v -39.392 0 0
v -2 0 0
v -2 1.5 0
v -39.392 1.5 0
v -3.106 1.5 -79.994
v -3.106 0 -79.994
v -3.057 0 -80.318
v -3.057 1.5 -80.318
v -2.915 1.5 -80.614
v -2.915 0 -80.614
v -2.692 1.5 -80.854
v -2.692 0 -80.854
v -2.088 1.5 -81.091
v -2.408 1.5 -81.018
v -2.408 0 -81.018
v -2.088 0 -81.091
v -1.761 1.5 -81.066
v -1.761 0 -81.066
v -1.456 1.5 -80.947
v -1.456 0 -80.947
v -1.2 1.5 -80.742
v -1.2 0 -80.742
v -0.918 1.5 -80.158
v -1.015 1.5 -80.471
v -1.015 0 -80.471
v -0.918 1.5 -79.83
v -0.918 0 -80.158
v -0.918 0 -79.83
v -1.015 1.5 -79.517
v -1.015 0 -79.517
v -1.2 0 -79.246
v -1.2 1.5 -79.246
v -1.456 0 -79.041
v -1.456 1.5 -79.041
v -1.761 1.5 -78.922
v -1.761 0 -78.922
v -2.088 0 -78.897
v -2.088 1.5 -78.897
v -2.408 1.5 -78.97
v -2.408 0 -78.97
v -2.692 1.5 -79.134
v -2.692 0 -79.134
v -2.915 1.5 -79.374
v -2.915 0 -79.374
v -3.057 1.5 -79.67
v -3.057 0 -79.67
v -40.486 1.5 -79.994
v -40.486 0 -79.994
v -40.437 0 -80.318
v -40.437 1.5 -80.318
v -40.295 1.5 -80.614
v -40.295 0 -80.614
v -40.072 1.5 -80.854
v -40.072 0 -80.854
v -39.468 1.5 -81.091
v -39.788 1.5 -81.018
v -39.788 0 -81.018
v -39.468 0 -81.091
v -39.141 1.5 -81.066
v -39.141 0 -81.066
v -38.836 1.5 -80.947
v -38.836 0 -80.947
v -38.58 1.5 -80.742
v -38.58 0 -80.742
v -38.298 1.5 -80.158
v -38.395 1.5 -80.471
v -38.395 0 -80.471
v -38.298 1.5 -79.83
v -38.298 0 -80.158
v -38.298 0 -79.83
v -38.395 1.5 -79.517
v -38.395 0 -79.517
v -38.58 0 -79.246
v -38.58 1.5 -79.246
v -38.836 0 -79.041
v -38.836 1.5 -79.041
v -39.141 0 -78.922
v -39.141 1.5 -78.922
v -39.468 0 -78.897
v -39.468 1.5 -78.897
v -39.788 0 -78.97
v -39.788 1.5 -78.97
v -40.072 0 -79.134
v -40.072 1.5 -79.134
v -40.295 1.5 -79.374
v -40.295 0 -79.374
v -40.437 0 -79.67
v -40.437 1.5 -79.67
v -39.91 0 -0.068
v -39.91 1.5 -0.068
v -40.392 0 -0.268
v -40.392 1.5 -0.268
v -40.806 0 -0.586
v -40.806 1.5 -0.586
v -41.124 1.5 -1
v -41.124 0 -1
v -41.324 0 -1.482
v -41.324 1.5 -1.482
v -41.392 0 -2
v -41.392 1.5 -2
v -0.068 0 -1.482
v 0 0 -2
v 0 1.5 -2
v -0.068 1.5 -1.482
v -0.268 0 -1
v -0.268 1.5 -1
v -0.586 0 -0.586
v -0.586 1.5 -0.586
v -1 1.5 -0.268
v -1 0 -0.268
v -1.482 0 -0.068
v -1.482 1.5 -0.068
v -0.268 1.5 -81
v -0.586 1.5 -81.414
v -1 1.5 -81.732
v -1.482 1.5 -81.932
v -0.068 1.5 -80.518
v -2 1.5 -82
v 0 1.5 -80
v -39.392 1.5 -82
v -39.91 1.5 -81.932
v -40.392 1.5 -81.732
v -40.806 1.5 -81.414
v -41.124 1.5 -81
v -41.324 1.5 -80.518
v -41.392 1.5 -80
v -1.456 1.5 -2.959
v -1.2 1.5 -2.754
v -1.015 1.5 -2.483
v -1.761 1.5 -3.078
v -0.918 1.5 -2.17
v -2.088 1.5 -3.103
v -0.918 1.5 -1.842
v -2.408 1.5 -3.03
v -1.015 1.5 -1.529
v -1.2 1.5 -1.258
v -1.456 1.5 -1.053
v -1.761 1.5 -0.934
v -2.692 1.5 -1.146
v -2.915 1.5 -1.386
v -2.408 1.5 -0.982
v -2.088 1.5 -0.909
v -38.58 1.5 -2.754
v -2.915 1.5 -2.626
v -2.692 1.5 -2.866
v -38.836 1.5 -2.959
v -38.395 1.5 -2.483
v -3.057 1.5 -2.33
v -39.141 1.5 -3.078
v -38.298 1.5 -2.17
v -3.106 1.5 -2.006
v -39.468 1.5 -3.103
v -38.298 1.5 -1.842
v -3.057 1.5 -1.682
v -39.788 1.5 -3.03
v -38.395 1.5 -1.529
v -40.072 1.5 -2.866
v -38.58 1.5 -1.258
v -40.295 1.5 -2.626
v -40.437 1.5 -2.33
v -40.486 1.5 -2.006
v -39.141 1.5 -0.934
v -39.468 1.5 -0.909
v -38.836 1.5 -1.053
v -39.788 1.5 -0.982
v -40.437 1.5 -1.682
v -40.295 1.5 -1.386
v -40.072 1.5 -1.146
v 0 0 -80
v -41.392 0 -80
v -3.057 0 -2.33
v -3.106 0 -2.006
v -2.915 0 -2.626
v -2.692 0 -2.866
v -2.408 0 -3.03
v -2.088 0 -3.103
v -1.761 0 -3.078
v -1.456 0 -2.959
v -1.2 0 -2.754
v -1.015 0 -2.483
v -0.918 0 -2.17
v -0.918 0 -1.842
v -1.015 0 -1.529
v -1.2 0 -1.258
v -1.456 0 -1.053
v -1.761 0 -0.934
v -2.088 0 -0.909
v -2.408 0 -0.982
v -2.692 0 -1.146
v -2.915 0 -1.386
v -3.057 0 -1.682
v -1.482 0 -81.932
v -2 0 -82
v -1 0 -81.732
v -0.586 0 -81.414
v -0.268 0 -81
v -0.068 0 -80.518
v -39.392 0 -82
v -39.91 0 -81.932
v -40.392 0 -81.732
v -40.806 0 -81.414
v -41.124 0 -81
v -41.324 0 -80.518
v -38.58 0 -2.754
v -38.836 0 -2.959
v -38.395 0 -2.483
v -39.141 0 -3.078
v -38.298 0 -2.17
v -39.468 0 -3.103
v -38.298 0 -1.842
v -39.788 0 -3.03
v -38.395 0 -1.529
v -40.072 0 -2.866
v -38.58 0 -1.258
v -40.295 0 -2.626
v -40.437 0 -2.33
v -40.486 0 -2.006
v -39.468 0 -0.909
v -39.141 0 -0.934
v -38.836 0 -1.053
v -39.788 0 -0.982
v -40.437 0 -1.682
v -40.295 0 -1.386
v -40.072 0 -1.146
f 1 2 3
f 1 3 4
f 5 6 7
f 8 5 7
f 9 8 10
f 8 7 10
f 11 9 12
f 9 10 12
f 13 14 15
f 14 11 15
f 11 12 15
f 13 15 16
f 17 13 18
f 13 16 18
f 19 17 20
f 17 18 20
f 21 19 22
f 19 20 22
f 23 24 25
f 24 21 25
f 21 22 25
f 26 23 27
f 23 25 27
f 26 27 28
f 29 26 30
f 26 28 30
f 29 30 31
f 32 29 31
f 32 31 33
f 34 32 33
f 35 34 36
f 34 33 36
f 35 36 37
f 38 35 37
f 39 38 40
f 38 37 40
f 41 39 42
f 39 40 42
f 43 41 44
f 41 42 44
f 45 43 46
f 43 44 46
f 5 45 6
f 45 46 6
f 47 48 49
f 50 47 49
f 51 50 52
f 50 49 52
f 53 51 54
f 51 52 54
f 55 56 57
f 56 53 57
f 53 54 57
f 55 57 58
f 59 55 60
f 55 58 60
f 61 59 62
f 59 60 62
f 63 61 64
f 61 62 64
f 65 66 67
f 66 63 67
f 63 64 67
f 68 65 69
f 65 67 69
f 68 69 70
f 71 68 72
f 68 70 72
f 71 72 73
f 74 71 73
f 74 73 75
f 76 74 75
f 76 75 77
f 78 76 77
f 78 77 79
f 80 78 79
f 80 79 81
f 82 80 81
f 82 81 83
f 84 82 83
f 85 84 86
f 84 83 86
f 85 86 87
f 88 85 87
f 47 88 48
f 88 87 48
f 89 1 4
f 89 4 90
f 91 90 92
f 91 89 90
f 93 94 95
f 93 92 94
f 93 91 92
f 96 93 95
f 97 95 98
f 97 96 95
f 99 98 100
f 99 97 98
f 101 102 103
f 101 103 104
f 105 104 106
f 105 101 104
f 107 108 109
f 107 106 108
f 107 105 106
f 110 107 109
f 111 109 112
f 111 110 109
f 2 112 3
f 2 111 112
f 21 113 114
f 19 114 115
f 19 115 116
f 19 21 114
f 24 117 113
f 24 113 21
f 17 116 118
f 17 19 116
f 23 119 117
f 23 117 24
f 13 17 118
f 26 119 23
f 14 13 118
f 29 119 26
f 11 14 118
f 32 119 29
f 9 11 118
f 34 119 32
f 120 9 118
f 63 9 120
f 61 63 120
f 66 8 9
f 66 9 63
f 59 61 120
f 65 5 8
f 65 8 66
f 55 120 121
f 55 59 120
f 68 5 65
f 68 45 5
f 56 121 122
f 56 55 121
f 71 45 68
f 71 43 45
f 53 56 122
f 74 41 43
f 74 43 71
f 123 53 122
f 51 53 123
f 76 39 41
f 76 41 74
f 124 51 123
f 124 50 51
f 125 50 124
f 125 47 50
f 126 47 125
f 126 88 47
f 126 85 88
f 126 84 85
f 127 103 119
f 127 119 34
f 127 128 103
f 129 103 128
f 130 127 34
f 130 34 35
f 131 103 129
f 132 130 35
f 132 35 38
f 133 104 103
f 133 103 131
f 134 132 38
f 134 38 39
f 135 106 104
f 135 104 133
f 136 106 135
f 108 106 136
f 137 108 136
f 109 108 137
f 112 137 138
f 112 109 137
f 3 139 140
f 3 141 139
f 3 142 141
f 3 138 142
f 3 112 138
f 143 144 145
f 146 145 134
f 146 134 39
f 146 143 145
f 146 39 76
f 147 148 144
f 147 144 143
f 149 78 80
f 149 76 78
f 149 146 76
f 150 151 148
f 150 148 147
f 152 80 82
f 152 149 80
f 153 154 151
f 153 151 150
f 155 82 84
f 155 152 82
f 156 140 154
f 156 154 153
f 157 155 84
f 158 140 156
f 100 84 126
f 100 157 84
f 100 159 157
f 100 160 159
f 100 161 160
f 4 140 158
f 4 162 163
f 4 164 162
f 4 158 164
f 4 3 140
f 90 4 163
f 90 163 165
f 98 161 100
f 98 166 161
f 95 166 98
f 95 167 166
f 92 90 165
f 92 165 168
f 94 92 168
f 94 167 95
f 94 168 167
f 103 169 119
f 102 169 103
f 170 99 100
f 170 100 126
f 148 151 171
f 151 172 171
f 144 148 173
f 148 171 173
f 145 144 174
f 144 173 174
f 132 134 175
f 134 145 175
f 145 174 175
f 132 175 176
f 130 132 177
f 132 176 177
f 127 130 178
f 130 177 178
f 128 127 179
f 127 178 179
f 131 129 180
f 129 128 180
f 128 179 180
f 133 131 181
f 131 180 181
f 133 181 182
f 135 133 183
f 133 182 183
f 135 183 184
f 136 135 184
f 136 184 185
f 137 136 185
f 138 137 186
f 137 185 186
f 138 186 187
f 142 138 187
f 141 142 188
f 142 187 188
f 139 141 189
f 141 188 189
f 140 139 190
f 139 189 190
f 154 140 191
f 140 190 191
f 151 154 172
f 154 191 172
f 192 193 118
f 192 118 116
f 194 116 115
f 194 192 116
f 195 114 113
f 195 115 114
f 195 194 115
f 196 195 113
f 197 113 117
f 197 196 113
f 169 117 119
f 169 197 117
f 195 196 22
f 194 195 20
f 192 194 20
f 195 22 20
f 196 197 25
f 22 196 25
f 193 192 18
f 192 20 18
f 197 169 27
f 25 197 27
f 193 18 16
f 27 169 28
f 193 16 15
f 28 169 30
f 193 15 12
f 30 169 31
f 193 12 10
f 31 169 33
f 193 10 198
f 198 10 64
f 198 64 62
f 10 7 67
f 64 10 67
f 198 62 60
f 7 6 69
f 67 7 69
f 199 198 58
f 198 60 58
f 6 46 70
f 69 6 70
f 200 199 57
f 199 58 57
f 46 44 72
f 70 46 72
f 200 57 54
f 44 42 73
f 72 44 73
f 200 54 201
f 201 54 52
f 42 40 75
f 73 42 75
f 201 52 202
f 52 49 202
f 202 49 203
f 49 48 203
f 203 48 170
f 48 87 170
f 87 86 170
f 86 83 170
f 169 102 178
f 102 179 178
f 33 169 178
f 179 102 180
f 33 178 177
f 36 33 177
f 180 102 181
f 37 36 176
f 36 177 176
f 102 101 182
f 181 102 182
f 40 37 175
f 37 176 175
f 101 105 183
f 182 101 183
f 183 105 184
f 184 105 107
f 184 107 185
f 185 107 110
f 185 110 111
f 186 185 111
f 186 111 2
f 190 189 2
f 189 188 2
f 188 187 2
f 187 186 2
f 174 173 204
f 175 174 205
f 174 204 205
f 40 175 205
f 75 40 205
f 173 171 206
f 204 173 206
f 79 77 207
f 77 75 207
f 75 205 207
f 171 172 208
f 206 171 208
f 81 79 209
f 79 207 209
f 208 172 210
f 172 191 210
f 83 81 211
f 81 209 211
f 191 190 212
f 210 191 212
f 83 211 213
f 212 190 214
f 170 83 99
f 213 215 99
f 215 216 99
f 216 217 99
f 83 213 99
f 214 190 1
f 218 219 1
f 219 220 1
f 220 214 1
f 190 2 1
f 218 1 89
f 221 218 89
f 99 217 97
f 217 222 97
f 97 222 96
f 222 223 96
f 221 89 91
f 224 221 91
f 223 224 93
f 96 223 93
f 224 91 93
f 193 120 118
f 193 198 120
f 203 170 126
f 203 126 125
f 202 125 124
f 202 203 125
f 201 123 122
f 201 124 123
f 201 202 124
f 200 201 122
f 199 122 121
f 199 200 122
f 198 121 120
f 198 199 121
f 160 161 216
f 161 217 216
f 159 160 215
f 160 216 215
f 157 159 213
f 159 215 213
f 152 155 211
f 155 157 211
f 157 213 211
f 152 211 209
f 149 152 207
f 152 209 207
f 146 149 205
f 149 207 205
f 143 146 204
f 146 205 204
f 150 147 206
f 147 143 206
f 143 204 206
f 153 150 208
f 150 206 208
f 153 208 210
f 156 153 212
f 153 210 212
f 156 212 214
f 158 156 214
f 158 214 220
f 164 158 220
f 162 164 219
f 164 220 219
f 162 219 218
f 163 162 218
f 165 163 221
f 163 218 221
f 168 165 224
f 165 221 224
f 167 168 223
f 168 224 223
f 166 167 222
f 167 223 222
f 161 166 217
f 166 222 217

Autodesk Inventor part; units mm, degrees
ref_plane "YZ Plane" through (0, 0, 0) normal (1, 0, 0) x (0, 1, 0)
ref_plane "XZ Plane" through (0, 0, 0) normal (0, 1, 0) x (-1, 0, 0)
ref_plane "XY Plane" through (0, 0, 0) normal (0, 0, 1) x (1, 0, 0)
sketch "Sketch1" plane through (0, 0, 0) normal (0, 1, 0) x (-1, 0, 0)
  line L0 (2, 0) -> (39.392, 0)
  line L1 (41.392, -2) -> (41.392, -80)
  line L2 (39.392, -82) -> (2, -82)
  line L3 (0, -80) -> (0, -2)
  arc A0 (41.392, -2) -> (39.392, 0) centre (39.392, -2) ccw
  arc A1 (39.392, -82) -> (41.392, -80) centre (39.392, -80) ccw
  arc A2 (0, -80) -> (2, -82) centre (2, -80) ccw
  arc A3 (2, 0) -> (0, -2) centre (2, -2) ccw
  circle A4 centre (39.386, -2.006) radius 1.1
  circle A5 centre (39.386, -79.994) radius 1.1
  circle A6 centre (2.006, -2.006) radius 1.1
  circle A7 centre (2.006, -79.994) radius 1.1
  point P0 (0, 0)
  point P1 (41.392, -82)
  point P2 (41.392, 0)
  point P3 (0, -82)
  dimension "d0" = 41.392
  dimension "d1" = 82
  dimension "d2" = 2
  dimension "d3" = 2.2
  dimension "d5" = 2.006
  dimension "d6" = 2.006
  dimension "d7" = 2.2
  dimension "d8" = 2.006
  dimension "d9" = 2.006
  dimension "d10" = 2.2
  dimension "d11" = 2.006
  dimension "d12" = 2.006
  dimension "d13" = 2.2
  dimension "d14" = 2.006
  dimension "d15" = 2.006
  dimension "d16" = 37.386
extrude "Extrusion1" add sketch "Sketch1" along normal blind 1.5
properties part number "battery_cover"
